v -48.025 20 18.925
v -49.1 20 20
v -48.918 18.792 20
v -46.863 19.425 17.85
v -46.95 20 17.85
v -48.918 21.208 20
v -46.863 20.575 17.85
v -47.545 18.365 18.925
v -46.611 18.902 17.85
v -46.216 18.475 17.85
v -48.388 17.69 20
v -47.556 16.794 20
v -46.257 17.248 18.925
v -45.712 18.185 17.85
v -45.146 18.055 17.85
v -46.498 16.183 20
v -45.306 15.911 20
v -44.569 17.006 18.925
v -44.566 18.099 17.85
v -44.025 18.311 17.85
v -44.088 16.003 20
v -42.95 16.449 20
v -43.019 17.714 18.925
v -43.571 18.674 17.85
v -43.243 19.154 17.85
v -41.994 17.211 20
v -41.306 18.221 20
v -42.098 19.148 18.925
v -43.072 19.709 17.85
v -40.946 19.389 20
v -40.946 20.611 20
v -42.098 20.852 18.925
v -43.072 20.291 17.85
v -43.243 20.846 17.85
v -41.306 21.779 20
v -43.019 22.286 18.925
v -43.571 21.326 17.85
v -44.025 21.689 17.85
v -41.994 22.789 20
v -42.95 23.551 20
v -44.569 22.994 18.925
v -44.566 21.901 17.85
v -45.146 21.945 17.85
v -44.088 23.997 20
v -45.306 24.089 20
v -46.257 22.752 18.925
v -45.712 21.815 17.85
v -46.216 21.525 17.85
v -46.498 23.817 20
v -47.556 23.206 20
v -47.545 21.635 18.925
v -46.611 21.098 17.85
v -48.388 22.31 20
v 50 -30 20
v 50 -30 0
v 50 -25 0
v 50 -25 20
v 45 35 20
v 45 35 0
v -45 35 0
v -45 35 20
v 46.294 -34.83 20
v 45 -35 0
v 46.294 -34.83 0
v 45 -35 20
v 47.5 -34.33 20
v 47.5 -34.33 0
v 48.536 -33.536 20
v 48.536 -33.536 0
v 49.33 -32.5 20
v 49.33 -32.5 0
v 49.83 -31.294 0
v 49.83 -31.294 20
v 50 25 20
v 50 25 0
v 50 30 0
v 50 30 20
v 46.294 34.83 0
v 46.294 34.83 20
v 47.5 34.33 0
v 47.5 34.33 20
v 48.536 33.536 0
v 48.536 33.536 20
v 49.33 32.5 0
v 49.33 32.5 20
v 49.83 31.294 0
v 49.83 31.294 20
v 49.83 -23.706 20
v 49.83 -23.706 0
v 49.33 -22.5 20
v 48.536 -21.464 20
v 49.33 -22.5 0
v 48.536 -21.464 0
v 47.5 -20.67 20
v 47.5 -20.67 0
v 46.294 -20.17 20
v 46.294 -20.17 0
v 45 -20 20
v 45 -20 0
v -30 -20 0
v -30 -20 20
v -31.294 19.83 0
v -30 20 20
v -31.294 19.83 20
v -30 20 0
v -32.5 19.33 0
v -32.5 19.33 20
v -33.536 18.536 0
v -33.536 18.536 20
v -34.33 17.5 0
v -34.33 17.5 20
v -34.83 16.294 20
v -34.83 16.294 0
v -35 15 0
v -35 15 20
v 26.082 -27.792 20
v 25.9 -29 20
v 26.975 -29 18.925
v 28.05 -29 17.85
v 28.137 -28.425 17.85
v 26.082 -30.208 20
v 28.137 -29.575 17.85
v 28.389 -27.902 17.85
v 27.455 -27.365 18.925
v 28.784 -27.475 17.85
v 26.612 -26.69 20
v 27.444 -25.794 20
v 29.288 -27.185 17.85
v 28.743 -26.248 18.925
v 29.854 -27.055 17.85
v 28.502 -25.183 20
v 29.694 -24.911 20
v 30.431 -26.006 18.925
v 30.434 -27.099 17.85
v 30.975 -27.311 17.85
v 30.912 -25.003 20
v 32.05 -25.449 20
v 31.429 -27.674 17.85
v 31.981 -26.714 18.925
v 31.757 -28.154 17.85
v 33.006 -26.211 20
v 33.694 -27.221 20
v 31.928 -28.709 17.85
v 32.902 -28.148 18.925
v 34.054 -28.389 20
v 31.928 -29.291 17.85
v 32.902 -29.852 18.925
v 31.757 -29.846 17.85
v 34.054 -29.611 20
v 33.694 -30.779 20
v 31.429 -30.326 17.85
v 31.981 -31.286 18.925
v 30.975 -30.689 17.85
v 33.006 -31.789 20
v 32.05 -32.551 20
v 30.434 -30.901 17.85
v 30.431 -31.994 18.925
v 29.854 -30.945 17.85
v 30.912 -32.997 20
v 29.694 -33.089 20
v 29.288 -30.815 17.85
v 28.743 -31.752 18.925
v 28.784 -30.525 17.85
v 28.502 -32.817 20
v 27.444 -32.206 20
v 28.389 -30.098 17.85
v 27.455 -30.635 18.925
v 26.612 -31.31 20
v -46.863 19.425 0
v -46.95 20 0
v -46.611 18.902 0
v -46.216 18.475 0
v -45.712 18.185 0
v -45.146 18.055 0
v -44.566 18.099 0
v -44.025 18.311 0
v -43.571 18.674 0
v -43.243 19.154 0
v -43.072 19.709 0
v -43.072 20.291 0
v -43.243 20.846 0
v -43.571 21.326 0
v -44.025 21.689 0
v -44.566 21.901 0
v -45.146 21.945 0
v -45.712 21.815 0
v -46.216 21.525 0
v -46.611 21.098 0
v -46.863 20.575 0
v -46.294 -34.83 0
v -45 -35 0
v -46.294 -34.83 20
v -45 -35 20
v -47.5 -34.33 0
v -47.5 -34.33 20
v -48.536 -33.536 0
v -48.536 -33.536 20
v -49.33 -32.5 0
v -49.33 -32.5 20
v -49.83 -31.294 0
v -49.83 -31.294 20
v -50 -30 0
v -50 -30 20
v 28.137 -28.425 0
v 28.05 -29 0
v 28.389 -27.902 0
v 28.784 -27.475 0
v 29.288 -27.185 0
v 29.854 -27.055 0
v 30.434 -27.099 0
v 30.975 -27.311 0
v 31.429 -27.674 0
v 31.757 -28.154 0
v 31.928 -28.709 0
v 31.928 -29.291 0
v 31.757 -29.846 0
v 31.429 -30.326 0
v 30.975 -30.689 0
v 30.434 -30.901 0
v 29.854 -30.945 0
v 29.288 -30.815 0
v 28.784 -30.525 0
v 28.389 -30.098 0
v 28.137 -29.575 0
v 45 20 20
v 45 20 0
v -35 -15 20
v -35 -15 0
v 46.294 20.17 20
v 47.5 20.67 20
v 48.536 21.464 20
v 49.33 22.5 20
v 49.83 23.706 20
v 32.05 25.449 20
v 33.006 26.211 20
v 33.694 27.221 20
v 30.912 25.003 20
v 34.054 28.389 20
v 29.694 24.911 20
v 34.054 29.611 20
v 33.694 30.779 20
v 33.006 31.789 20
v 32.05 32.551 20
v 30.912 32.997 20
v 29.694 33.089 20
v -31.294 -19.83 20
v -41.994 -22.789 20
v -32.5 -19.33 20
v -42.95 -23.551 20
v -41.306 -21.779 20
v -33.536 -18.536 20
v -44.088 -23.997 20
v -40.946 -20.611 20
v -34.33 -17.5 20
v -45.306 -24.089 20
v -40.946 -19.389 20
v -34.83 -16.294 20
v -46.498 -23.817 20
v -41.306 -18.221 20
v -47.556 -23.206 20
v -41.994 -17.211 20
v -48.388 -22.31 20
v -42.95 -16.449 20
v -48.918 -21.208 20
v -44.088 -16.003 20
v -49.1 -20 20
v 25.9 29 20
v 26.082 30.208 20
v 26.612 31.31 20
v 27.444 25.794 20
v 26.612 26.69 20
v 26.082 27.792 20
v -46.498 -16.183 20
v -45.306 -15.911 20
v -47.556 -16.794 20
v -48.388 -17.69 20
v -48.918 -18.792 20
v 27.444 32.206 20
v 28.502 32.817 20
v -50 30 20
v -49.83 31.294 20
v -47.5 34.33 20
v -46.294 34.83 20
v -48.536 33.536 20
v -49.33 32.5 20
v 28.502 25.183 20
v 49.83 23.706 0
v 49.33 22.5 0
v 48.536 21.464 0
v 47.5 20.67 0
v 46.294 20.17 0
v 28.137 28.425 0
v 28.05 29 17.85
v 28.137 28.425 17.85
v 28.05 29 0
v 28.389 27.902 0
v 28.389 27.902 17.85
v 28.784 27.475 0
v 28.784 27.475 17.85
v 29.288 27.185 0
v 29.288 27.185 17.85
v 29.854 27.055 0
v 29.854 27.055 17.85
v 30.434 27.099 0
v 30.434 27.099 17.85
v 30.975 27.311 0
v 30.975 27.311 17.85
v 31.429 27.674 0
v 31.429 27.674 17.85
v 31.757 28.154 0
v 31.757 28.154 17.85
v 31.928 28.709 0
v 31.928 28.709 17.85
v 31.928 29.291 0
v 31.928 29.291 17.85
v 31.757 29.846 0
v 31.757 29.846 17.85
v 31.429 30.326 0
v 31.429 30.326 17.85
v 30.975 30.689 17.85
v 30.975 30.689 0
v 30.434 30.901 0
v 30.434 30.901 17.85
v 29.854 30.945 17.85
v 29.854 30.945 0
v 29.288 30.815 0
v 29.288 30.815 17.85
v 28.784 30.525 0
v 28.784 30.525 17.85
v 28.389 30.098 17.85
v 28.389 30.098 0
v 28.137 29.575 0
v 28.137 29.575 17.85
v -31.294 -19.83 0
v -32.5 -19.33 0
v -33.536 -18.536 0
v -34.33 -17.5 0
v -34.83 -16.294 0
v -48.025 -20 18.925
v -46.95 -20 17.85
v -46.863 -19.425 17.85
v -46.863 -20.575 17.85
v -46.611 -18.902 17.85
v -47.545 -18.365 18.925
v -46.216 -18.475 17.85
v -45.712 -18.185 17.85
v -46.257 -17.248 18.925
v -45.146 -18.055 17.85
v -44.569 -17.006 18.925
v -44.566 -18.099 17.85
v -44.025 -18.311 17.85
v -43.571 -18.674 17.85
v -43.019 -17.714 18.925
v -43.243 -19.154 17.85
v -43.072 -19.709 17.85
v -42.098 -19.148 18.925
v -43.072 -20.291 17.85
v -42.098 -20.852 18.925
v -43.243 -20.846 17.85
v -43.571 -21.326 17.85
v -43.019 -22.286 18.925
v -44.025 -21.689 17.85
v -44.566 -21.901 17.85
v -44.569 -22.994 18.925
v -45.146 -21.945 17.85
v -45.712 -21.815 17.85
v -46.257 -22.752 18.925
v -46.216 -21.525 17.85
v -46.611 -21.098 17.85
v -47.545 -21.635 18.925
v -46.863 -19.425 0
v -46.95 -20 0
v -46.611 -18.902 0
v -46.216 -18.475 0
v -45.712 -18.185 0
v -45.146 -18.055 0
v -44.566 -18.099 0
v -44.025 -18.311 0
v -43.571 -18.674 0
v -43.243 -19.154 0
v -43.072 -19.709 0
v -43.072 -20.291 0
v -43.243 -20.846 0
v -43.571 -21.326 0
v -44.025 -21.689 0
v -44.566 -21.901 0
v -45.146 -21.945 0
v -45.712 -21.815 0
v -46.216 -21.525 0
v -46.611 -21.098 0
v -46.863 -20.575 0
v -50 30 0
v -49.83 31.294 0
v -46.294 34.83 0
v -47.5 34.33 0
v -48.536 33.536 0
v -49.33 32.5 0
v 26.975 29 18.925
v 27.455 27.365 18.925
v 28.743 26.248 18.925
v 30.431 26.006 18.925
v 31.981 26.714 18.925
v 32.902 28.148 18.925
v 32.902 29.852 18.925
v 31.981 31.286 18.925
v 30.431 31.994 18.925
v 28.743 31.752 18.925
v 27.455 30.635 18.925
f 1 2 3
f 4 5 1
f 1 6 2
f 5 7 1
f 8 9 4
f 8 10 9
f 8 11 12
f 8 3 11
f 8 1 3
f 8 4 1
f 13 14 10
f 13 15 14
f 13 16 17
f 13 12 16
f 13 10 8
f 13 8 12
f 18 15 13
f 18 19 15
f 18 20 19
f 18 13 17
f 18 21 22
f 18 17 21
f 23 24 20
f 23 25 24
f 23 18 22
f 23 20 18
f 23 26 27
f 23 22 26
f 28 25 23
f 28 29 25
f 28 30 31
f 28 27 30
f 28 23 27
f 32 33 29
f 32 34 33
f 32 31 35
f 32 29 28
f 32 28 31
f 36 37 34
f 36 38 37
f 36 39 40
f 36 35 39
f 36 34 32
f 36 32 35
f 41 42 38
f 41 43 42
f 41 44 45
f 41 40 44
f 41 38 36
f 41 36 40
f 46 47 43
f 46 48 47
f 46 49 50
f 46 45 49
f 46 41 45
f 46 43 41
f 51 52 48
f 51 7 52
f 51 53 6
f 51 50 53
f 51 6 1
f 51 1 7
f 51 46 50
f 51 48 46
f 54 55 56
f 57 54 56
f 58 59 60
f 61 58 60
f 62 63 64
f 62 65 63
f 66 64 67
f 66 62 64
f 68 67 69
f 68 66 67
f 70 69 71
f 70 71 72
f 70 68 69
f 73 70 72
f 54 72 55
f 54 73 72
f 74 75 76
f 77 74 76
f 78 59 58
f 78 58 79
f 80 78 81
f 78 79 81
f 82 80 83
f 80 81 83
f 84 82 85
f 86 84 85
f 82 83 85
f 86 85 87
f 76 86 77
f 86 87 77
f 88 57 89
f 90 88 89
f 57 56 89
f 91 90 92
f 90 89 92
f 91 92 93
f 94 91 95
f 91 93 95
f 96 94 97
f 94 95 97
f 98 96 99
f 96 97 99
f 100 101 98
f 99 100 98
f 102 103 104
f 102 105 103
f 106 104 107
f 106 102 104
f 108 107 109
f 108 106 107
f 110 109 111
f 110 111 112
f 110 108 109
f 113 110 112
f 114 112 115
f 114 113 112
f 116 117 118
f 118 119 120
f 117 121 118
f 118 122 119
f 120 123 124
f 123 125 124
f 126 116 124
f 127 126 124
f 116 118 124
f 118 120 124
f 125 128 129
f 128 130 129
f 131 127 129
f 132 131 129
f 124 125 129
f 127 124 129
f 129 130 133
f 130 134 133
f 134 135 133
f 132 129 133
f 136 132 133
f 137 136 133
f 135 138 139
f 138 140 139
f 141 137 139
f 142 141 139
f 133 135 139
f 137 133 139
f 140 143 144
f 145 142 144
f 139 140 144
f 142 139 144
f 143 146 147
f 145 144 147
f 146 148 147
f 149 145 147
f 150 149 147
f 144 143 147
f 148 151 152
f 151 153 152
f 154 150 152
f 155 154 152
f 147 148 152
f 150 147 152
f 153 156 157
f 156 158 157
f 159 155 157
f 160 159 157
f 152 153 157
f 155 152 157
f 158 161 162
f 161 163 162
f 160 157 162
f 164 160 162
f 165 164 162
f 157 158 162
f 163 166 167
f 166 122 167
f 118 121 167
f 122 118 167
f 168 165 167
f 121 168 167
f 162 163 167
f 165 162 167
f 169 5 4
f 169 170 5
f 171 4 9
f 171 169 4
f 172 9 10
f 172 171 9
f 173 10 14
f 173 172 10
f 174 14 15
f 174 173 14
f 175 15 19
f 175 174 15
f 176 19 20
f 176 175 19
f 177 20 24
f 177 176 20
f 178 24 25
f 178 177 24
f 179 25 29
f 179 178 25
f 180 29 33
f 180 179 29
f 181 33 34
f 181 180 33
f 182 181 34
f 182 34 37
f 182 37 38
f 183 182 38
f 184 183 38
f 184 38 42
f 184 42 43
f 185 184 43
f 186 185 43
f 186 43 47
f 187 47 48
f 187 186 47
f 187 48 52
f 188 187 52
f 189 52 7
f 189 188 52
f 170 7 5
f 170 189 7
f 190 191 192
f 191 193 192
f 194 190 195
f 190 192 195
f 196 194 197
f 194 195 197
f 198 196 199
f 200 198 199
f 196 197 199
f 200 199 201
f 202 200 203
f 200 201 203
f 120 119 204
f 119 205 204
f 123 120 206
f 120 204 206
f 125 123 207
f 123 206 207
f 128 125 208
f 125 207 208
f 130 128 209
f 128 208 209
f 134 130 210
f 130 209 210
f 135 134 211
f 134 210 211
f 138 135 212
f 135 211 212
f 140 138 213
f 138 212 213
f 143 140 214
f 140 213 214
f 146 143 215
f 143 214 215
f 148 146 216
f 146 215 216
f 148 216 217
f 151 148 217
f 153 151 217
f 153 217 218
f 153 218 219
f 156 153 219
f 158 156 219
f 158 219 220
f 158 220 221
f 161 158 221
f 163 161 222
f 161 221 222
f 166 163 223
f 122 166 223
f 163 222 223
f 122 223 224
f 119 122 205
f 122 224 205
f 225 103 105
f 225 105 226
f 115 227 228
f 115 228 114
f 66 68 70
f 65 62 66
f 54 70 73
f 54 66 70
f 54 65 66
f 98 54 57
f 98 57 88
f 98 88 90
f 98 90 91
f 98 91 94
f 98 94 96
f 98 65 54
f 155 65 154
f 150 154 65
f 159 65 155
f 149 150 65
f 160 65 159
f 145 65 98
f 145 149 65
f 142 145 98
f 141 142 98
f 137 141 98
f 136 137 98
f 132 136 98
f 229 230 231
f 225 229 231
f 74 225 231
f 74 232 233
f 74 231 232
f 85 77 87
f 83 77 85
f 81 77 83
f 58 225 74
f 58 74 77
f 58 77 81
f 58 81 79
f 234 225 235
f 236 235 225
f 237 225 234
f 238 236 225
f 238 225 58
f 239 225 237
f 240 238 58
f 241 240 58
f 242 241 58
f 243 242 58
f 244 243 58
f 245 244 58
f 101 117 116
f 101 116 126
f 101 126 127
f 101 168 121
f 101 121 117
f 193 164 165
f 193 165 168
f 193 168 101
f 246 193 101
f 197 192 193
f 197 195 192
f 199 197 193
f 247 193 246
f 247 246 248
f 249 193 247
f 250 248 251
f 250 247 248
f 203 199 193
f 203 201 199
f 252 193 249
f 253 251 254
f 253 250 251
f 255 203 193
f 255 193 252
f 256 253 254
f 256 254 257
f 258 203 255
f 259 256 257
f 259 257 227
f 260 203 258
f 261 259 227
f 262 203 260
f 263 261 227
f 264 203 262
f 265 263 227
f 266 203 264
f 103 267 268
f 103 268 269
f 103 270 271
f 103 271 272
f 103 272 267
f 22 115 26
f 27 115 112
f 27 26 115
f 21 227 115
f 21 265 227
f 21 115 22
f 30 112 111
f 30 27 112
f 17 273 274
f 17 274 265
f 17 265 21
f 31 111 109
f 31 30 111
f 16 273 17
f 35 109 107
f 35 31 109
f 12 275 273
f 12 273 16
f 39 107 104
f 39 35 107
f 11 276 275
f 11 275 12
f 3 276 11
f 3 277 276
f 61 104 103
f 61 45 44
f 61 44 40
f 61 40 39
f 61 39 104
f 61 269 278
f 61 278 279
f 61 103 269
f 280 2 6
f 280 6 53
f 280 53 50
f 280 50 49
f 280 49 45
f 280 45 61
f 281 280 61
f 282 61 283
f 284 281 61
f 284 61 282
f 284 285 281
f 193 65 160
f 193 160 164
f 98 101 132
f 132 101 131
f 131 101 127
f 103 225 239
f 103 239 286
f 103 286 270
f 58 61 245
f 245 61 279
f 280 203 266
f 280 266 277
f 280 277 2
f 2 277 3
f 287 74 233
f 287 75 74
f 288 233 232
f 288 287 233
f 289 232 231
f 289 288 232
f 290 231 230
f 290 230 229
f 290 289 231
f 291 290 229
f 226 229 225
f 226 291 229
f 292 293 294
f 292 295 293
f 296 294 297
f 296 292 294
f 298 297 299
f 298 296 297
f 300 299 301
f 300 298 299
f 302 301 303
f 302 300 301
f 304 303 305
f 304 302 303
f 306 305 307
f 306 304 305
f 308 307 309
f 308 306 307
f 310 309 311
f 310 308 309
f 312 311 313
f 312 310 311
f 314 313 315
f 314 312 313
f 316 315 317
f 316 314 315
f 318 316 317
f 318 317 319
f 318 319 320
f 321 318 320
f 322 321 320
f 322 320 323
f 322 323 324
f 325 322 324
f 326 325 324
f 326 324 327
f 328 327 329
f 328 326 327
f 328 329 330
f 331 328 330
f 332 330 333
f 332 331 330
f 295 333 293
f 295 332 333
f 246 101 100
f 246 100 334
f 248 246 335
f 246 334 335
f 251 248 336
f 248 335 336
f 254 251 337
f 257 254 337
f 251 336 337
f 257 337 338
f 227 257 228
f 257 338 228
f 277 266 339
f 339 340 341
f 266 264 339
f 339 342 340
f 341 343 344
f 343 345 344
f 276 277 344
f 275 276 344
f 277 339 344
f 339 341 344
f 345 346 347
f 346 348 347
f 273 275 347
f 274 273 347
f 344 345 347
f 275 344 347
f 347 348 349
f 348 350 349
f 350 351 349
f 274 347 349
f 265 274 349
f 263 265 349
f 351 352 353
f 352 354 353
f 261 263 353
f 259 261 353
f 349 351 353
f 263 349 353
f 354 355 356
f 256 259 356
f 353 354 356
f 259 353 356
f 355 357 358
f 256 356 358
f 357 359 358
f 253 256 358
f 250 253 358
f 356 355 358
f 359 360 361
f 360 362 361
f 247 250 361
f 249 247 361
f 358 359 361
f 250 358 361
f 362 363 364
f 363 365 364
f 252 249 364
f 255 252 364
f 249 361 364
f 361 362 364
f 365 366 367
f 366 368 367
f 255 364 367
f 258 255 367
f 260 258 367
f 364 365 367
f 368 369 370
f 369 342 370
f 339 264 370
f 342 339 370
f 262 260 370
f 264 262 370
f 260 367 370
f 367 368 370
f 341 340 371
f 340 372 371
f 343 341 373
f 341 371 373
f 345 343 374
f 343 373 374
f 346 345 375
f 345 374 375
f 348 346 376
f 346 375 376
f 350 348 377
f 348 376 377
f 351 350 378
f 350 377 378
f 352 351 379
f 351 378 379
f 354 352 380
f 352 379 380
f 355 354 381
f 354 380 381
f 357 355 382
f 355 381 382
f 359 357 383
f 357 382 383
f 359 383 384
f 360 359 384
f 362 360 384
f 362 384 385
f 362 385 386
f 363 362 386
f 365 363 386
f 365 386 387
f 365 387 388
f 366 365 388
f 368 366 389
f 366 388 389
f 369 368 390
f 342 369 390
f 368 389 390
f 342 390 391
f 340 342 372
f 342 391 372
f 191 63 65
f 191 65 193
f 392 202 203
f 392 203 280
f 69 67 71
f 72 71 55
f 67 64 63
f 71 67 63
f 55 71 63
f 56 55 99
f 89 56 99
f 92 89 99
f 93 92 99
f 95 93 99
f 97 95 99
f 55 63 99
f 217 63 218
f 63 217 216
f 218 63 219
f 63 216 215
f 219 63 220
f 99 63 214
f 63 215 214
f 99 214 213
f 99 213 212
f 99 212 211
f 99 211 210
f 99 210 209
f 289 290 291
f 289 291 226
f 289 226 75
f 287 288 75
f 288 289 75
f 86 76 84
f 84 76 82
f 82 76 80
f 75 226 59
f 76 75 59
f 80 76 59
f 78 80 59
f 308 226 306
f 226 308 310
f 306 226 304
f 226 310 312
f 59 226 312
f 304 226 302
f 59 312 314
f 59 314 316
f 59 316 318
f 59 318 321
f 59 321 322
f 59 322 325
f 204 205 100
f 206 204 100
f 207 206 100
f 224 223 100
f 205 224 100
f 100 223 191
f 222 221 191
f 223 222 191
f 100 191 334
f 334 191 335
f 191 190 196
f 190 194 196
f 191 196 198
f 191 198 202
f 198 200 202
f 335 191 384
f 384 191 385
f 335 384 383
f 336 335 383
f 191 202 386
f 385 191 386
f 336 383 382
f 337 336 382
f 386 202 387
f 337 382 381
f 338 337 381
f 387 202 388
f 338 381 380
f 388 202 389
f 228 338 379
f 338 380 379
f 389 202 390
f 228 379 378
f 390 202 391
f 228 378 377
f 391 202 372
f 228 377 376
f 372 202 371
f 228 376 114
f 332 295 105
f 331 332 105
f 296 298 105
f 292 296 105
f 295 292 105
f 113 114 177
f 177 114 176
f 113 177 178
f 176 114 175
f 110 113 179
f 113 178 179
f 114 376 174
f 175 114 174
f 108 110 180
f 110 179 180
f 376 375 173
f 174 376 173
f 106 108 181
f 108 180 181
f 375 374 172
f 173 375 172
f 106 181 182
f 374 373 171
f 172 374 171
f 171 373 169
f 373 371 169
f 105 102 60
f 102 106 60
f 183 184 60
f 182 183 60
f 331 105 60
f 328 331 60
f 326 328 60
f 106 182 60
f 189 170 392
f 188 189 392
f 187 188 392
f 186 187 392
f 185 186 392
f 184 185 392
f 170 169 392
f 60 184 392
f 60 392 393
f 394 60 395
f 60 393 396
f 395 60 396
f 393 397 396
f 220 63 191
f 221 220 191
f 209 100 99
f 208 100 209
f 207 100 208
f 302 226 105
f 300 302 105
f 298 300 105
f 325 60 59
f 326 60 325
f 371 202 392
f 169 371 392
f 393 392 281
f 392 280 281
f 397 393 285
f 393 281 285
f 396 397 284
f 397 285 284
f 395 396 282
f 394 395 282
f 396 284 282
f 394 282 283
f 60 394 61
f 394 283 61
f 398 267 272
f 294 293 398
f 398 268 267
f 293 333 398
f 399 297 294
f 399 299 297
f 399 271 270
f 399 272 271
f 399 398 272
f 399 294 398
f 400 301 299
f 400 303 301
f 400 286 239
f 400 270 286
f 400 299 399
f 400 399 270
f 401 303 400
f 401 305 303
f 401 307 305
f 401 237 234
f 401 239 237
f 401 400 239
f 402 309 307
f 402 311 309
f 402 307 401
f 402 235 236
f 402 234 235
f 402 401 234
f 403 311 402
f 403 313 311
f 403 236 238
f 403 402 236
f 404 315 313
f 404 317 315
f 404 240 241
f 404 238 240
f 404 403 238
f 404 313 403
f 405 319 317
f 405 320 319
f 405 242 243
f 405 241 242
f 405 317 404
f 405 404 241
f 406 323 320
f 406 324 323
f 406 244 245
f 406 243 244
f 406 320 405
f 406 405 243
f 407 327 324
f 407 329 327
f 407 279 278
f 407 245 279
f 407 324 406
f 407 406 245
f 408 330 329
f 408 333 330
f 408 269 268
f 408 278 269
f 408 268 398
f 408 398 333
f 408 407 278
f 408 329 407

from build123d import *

# Parameters (mm, degrees)
SCHIZZO1_W                               = 70
SCHIZZO1_H                               = 100
ESTRUSIONE_ESTRUSIONE1_DEPTH             = 20
FORO_SVASATO_PER_VITE_M3_5_2_D           = 3.9
FORO_SVASATO_PER_VITE_M3_5_2_CSINK_D     = 8.2
FORO_SVASATO_PER_VITE_M3_5_2_CSINK_ANGLE = 90
SCHIZZO8_W                               = 85
SCHIZZO8_H                               = 40
TAGLIO_ESTRUSIONE1_DEPTH                 = 65.226162893
RACCORDO2_R                              = 5


with BuildPart() as part:
    # Schizzo1 → Estrusione-Estrusione1 (new body)
    with BuildSketch(Plane(origin=(0, 0, 0), x_dir=(0, 1, 0), z_dir=(0, 0, 1))):
        Rectangle(SCHIZZO1_W, SCHIZZO1_H)
    extrude(amount=ESTRUSIONE_ESTRUSIONE1_DEPTH)

    # Foro svasato per Vite M3.5-2 (through all)
    with Locations(Plane.XY.offset(20)):
        with Locations((-45, -20), (30, -29)):
            foro_svasato_per_vite_m3_5_2 = CounterSinkHole(FORO_SVASATO_PER_VITE_M3_5_2_D / 2, FORO_SVASATO_PER_VITE_M3_5_2_CSINK_D / 2, counter_sink_angle=FORO_SVASATO_PER_VITE_M3_5_2_CSINK_ANGLE)

    # Specchia1: Foro svasato per Vite M3.5-2 across plane
    add(foro_svasato_per_vite_m3_5_2.mirror(Plane.ZX), mode=Mode.SUBTRACT)

    # Schizzo8 → Taglio-Estrusione1 (cut, through all)
    with BuildSketch(Plane.XY.offset(20)):
        with Locations((7.5, 0)):
            Rectangle(SCHIZZO8_W, SCHIZZO8_H)
    extrude(amount=-TAGLIO_ESTRUSIONE1_DEPTH, mode=Mode.SUBTRACT)

    # Raccordo2
    raccordo2_edges = [part.edges().sort_by_distance(p)[0] for p in [
        (50, 20, 10),
        (50, -20, 10),
        (-35, -20, 10),
        (-35, 20, 10),
        (50, 35, 10),
        (50, -35, 10),
        (-50, -35, 10),
        (-50, 35, 10),
    ]]
    fillet(raccordo2_edges, radius=RACCORDO2_R)


solid = part.part
